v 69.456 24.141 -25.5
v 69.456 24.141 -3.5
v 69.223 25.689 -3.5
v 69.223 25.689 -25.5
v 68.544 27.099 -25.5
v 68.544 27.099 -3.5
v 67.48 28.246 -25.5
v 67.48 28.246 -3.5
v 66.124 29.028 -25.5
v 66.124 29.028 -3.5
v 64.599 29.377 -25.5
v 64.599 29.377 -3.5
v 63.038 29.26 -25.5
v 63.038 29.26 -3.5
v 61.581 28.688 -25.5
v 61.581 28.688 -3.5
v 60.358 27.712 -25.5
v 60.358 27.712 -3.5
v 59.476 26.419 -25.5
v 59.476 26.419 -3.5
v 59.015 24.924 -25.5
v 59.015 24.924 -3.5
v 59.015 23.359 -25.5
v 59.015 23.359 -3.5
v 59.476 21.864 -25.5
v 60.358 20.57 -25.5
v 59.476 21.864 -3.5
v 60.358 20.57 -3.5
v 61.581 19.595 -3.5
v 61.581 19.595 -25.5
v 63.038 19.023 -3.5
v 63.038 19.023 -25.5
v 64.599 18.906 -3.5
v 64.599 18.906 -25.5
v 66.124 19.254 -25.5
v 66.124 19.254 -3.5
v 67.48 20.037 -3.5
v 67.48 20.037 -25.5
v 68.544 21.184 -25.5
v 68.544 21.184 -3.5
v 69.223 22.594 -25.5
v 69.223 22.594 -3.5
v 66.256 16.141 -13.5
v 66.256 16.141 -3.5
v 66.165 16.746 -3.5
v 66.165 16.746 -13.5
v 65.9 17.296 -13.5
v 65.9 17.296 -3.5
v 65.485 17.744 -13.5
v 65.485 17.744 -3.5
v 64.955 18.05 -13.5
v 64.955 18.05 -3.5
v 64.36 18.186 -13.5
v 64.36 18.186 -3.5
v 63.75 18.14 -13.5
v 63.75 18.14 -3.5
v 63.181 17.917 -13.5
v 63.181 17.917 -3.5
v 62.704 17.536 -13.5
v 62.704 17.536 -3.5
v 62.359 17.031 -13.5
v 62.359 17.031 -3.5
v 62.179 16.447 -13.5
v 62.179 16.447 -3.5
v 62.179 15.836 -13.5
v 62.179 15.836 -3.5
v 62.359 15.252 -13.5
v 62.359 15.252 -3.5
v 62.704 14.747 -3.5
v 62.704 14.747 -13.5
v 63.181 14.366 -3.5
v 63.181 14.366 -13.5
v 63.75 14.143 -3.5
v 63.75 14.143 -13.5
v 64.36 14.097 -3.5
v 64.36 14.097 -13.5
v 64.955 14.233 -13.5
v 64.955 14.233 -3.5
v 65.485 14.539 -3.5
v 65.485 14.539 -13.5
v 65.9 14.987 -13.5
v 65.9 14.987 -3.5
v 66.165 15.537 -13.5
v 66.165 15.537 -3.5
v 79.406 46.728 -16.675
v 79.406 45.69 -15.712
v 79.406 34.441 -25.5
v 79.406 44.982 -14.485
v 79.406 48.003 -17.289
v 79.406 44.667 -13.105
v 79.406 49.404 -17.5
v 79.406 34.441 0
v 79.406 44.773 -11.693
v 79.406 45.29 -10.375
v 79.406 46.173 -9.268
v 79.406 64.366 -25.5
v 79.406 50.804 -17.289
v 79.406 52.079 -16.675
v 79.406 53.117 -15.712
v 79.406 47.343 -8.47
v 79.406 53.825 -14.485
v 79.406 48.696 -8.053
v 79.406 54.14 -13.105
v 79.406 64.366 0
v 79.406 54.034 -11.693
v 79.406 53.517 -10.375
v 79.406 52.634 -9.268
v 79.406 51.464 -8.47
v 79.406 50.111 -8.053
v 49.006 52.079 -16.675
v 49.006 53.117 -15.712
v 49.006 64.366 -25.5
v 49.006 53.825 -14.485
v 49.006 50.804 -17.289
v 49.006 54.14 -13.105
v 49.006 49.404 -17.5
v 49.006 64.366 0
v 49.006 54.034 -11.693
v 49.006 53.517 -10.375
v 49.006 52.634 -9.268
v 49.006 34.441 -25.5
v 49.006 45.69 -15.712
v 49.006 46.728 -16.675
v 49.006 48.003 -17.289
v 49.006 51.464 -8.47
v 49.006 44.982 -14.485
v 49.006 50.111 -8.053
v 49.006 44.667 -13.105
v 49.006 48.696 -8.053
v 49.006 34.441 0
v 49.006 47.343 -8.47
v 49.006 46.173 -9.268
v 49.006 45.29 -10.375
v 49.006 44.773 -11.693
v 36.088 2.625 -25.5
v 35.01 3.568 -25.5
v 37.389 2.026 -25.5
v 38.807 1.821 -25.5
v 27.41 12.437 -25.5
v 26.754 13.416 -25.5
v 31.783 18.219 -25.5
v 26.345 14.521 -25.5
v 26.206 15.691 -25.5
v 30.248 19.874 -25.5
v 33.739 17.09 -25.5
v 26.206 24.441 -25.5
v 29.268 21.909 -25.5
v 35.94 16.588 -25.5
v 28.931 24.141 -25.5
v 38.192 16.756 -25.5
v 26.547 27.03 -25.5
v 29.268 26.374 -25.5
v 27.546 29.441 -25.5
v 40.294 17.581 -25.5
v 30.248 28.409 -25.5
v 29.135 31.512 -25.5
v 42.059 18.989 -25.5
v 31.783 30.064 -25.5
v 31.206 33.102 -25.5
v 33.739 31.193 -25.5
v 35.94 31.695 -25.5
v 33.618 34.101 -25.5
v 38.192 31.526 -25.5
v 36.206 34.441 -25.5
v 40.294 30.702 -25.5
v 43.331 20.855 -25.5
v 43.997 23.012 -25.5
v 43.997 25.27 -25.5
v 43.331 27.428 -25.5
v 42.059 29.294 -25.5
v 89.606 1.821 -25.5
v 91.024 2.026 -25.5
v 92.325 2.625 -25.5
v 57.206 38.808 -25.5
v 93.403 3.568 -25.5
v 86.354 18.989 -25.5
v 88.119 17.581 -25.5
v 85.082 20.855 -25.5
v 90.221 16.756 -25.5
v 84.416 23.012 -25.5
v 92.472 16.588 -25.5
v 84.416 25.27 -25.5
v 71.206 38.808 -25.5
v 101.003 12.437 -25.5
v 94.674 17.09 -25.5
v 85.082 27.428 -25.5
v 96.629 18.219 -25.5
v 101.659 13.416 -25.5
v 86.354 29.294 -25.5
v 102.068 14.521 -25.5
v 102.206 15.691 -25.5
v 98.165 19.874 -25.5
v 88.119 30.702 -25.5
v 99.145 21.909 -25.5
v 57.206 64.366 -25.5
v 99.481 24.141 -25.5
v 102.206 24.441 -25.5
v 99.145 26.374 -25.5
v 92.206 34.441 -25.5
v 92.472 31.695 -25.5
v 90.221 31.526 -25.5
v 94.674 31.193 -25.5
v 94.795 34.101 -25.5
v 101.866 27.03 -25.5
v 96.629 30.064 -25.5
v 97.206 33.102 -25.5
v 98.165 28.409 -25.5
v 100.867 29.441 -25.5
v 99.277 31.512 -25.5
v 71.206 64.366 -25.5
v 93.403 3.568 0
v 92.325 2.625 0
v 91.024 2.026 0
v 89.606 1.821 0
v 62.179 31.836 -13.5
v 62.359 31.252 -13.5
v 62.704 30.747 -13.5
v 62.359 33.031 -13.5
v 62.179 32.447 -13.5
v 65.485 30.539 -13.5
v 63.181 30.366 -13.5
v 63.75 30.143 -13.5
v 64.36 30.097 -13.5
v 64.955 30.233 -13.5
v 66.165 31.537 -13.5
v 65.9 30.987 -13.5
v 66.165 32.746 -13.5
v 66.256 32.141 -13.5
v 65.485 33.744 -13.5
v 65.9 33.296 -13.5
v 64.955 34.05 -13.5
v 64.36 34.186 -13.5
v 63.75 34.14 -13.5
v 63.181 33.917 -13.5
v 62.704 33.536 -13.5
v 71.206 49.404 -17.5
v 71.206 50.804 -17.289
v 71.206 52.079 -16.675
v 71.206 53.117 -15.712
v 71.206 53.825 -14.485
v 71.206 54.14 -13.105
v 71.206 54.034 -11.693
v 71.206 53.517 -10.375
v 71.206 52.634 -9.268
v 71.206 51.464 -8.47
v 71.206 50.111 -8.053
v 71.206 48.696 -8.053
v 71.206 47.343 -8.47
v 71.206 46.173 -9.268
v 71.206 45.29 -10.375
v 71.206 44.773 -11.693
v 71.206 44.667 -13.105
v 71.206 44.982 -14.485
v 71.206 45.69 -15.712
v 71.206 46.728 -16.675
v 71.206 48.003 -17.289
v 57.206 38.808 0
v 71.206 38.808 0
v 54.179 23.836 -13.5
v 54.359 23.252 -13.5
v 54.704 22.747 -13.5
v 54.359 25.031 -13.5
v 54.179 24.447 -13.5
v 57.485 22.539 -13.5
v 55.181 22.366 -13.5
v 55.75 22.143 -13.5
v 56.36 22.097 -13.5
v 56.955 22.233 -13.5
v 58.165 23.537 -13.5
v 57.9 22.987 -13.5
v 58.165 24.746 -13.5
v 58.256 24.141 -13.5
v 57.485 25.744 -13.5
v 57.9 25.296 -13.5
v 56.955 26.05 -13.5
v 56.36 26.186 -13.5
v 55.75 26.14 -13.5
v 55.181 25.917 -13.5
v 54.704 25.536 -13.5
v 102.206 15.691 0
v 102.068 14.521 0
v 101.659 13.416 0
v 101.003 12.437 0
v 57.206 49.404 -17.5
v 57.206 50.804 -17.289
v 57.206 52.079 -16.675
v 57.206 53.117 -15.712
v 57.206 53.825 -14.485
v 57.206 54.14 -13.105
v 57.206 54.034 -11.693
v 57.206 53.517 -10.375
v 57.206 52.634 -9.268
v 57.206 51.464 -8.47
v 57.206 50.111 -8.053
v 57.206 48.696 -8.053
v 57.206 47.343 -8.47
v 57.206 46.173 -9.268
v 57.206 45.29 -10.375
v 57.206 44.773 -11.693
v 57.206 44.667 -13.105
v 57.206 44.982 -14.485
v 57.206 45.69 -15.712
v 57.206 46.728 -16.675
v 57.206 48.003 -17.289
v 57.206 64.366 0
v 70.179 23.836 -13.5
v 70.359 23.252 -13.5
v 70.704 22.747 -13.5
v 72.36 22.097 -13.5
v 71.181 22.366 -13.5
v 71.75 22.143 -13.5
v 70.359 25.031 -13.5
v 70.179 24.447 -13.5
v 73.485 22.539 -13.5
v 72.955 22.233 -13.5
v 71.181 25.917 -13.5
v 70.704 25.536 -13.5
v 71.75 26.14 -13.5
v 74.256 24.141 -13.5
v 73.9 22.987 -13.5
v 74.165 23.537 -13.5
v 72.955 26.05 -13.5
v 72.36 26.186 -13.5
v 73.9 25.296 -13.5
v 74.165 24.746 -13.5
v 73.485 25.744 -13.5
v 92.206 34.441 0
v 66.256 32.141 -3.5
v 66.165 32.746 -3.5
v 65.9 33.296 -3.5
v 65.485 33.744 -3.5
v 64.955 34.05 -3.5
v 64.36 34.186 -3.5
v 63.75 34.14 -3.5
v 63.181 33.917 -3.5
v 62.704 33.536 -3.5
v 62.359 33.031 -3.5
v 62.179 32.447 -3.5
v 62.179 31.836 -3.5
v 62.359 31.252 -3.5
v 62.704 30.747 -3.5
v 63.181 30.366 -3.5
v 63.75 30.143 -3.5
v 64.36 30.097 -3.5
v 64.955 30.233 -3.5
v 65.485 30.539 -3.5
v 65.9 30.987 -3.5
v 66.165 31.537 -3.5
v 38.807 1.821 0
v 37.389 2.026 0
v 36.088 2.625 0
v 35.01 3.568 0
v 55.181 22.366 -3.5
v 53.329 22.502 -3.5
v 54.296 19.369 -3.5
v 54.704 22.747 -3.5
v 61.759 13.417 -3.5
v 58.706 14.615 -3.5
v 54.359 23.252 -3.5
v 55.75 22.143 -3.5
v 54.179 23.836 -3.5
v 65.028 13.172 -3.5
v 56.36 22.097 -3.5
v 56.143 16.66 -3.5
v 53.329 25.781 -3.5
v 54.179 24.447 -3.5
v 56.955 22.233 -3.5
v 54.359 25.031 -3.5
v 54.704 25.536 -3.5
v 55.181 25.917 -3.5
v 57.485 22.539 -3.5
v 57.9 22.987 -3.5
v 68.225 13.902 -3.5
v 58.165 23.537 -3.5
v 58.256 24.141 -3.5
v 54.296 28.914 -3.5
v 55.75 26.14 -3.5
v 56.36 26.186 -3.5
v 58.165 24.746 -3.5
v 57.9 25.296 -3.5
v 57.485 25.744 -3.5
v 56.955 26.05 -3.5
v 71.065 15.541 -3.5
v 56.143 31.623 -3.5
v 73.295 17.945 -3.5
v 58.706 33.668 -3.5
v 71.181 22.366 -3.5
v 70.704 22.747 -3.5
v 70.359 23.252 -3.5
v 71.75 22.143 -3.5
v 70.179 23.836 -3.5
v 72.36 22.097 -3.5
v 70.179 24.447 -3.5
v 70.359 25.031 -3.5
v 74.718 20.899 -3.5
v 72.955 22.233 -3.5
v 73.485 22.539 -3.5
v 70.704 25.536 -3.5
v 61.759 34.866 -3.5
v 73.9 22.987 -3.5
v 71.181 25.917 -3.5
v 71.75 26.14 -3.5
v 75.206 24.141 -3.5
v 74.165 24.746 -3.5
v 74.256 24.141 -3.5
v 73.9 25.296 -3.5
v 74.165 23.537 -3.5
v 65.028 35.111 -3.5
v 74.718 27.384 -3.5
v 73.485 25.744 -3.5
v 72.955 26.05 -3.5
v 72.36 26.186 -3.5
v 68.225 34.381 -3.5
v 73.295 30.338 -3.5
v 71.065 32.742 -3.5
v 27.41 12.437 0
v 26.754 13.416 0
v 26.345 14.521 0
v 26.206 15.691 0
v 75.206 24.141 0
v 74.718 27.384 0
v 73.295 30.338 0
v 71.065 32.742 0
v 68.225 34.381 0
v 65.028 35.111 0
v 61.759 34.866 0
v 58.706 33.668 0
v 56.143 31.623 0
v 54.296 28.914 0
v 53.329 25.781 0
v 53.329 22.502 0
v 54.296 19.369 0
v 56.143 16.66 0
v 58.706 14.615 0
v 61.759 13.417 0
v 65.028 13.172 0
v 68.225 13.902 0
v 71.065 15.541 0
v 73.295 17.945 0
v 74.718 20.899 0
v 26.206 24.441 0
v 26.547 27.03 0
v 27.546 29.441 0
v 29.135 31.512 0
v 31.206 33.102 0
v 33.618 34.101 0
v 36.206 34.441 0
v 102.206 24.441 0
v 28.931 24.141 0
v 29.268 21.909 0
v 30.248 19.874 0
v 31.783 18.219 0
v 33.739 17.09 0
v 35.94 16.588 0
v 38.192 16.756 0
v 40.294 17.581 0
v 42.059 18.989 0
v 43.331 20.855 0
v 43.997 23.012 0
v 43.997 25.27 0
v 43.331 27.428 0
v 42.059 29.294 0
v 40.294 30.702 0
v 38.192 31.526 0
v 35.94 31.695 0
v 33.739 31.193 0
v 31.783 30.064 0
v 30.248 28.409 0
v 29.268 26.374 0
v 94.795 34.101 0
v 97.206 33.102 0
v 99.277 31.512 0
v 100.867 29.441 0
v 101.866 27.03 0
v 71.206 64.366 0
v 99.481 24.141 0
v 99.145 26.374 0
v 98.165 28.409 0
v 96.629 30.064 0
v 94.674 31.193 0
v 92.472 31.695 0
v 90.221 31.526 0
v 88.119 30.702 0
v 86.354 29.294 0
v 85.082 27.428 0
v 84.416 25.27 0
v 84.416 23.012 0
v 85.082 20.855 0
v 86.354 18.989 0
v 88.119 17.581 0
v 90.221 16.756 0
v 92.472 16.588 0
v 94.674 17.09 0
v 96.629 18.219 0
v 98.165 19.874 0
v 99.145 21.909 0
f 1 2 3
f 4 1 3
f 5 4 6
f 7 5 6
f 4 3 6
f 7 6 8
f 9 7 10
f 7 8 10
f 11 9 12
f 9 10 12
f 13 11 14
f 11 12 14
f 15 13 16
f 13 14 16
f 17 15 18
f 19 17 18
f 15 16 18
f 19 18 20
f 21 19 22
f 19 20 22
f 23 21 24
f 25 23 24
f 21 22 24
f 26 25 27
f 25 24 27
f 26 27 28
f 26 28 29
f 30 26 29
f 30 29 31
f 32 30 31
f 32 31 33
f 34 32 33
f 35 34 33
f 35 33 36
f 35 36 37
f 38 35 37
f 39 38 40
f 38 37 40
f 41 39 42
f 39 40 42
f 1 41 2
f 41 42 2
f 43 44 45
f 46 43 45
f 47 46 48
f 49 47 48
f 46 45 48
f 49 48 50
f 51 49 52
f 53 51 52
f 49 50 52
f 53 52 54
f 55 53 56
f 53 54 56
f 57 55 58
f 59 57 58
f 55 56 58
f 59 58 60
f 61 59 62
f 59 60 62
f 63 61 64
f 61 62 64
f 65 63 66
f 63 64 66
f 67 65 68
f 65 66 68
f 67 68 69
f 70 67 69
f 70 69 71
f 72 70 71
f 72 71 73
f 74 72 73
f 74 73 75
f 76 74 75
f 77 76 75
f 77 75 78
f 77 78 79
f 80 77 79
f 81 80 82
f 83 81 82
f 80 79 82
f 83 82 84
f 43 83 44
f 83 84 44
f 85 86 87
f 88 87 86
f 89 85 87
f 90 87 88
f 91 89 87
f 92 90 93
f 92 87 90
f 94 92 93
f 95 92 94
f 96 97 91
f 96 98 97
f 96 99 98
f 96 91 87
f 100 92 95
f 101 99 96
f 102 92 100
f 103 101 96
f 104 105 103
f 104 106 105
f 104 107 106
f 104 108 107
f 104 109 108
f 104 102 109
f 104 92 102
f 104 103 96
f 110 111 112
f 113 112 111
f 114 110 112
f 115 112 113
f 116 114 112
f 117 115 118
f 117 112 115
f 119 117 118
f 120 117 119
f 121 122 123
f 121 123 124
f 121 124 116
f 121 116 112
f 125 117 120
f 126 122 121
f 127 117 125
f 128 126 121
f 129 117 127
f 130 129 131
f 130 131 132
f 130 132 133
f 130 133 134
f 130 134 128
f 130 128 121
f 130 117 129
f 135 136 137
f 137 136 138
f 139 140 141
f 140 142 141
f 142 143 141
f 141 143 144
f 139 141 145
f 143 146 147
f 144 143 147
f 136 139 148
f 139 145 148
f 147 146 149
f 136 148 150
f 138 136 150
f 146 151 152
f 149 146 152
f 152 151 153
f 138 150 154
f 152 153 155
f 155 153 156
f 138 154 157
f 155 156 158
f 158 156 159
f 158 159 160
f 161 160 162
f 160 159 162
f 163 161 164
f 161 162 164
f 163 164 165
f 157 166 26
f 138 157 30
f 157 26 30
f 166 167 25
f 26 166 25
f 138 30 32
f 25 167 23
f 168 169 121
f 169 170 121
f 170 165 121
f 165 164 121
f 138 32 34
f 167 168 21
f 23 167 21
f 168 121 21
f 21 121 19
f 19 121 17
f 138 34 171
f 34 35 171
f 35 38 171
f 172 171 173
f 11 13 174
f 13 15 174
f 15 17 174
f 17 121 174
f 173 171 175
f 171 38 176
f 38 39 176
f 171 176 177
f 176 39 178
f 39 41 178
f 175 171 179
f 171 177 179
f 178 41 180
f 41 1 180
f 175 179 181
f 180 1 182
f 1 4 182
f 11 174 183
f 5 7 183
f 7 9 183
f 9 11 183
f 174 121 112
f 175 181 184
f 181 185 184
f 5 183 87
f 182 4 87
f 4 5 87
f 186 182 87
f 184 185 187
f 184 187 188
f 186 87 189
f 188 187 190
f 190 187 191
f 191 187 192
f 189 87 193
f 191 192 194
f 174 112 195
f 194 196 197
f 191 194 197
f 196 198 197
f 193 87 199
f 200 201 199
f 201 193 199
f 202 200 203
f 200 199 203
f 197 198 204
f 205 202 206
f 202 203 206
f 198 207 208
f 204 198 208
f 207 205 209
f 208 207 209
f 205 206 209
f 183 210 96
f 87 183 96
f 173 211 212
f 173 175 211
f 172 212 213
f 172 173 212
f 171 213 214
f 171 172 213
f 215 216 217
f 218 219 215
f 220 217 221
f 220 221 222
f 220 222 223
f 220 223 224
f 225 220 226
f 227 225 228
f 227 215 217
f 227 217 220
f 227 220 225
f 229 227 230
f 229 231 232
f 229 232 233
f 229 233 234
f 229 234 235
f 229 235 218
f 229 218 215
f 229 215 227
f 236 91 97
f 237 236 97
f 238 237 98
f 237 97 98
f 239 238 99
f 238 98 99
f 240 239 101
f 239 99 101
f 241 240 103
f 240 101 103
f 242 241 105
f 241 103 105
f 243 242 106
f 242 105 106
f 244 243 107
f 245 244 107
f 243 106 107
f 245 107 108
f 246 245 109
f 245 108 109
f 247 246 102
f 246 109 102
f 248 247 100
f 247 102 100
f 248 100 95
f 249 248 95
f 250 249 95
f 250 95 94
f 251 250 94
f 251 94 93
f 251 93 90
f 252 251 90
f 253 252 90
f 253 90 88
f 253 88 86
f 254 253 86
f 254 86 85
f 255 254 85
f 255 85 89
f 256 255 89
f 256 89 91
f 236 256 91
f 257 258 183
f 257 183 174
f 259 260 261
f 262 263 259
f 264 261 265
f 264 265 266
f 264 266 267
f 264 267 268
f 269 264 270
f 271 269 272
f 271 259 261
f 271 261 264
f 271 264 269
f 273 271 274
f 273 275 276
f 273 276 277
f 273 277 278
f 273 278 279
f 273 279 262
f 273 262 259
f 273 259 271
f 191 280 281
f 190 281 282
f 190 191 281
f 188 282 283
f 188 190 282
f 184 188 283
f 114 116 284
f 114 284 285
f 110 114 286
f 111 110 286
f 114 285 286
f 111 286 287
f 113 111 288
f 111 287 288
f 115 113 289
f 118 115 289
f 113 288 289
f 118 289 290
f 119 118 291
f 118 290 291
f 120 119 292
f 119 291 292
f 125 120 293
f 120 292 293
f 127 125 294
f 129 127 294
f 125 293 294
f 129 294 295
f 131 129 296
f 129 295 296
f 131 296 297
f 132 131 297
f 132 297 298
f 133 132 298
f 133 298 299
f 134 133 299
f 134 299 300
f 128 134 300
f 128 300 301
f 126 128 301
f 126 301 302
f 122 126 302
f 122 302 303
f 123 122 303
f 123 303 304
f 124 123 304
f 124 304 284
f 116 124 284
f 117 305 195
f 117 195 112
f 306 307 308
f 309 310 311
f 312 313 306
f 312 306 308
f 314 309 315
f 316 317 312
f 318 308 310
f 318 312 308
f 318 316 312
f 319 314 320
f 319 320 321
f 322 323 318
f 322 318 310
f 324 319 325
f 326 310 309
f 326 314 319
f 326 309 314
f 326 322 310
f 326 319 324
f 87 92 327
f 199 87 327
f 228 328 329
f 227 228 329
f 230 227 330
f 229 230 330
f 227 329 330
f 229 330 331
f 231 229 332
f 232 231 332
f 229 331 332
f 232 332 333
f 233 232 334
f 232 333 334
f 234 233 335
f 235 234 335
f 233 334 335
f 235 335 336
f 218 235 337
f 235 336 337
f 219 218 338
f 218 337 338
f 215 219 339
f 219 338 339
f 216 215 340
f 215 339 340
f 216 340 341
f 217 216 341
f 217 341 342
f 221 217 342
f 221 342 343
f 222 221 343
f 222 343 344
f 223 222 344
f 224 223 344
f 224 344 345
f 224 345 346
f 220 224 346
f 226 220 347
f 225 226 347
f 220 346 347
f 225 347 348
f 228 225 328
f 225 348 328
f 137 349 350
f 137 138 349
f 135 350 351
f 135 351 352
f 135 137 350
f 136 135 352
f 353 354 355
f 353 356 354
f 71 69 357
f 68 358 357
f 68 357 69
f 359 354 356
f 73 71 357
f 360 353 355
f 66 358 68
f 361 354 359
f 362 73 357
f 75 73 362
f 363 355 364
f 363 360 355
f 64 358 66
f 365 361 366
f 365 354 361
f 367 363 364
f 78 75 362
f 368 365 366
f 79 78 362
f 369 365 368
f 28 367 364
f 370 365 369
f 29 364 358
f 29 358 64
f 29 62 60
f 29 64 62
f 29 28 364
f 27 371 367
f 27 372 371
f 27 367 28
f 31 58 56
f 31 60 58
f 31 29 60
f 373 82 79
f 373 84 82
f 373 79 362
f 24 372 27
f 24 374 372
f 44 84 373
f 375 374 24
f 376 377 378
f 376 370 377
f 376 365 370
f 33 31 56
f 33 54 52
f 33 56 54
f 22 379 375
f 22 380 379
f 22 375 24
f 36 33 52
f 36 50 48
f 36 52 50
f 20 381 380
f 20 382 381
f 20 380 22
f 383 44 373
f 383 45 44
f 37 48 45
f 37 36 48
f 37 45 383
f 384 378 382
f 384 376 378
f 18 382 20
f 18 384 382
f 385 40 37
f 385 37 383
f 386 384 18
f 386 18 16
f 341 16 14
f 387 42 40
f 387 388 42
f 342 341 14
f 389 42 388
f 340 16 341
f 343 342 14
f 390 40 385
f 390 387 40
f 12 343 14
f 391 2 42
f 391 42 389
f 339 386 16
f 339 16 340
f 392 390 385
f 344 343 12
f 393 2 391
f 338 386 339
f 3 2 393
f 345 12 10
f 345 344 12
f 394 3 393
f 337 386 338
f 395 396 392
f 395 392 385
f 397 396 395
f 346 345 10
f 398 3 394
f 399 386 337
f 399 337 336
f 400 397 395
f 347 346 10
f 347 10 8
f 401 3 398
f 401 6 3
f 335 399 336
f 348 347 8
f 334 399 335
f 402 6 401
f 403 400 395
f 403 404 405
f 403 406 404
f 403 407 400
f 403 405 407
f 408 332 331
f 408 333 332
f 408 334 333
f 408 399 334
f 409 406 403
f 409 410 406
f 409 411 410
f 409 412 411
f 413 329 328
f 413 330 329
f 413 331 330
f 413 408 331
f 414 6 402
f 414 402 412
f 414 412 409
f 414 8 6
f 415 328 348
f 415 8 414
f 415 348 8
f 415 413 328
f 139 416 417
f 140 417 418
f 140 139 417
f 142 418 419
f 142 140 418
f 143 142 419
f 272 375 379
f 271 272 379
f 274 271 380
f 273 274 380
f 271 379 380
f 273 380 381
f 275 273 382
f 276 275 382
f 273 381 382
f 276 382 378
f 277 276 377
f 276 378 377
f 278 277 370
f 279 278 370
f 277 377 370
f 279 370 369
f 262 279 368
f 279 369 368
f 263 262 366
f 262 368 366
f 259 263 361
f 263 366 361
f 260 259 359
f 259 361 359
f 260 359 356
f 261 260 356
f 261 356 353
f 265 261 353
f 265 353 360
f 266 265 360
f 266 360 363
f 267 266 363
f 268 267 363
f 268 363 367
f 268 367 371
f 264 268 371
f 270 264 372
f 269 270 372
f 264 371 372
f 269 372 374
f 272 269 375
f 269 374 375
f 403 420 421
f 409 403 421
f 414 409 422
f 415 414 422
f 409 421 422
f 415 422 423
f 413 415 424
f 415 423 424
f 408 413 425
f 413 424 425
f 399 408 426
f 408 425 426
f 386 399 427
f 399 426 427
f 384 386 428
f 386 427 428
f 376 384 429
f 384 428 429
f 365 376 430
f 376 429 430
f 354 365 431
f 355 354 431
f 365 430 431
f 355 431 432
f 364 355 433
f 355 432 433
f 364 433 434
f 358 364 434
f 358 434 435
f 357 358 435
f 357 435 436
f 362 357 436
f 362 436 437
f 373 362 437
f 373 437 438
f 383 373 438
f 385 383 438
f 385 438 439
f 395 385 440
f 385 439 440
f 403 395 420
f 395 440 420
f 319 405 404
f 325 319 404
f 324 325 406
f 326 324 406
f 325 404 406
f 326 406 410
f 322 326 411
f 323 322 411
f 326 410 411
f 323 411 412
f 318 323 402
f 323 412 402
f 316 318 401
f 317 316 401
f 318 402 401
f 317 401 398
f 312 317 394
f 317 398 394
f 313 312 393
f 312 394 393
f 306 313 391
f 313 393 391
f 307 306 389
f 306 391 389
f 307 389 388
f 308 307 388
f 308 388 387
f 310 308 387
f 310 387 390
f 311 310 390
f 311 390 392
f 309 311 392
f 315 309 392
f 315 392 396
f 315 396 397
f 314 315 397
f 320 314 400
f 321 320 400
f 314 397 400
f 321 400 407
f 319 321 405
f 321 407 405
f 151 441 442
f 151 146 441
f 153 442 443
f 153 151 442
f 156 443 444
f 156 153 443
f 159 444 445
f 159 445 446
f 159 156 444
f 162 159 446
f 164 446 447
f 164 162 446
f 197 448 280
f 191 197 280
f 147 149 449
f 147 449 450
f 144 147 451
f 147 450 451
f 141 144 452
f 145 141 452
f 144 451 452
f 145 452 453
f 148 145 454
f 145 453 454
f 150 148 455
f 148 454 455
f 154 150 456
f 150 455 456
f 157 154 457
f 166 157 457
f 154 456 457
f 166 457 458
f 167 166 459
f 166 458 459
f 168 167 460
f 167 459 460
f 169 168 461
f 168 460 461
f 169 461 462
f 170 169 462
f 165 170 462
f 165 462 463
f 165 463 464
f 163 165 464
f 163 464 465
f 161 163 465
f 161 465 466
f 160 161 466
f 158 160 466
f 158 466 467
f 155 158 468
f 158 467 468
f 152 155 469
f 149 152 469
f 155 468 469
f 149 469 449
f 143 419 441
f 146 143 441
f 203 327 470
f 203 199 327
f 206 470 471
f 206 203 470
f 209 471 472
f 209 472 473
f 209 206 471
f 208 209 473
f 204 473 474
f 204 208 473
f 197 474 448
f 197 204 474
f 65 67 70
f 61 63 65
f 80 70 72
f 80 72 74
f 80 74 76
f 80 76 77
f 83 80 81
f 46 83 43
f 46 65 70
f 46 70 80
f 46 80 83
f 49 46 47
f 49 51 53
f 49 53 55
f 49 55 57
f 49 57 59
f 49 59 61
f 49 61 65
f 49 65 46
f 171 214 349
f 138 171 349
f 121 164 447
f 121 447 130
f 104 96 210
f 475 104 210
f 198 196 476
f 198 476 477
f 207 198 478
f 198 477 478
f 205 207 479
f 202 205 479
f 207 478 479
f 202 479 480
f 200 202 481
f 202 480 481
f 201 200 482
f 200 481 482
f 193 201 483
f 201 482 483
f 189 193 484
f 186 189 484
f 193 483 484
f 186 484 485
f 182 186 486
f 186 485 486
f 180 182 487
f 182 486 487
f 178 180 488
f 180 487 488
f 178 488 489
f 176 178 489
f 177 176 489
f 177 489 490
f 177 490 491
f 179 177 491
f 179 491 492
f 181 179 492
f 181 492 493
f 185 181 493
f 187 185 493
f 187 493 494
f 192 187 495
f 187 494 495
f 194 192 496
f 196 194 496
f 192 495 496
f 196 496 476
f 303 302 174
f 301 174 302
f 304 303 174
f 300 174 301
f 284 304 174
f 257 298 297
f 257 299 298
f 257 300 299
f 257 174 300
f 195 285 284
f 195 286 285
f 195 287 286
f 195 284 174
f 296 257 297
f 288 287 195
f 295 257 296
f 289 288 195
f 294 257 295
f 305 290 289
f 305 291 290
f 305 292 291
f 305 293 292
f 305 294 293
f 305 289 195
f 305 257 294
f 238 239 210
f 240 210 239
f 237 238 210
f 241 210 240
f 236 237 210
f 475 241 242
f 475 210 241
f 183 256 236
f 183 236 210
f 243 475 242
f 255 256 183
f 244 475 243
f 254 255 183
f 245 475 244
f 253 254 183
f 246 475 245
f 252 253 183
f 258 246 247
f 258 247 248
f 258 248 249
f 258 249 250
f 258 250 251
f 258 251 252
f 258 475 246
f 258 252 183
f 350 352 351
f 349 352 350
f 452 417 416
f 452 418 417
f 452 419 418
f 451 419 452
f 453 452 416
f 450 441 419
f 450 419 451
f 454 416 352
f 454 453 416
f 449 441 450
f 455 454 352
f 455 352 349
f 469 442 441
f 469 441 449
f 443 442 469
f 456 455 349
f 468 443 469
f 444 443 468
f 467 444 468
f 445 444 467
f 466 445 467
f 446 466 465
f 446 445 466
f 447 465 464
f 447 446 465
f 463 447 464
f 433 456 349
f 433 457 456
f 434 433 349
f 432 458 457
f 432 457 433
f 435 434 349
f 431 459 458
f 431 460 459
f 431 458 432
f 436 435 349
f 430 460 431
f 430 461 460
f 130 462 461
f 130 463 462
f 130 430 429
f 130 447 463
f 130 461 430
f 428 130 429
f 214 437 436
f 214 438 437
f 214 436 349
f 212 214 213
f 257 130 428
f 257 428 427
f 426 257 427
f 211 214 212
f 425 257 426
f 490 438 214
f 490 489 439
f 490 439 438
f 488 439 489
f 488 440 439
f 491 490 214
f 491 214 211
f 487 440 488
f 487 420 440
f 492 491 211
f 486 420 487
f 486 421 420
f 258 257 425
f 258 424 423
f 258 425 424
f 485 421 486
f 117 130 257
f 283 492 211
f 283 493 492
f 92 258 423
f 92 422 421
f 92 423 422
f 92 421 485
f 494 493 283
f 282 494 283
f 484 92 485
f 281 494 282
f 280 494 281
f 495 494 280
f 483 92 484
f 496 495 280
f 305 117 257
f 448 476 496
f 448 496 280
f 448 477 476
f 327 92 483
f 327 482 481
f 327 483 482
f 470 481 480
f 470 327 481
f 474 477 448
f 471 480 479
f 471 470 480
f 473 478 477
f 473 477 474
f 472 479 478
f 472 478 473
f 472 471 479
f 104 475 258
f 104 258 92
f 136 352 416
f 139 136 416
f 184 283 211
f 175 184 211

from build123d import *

# Parameters (mm, degrees)
CROQUIS1_R              = 7.575
SALIENTE_EXTRUIR1_DEPTH = 25.5
BOSS_EXTRUDE1_DEPTH     = 25.5
SKETCH7_R               = 11
CUT_EXTRUDE1_DEPTH      = 3.5
SKETCH9_R               = 5.25
CUT_EXTRUDE3_DEPTH      = 22
REDONDEO1_R             = 10
FILLET1_R               = 5
SKETCH8_R               = 4.75
CUT_EXTRUDE2_DEPTH      = 88.312260382
SKETCH11_R              = 2.05
CUT_EXTRUDE4_DEPTH      = 10


with BuildPart() as part:
    # Croquis1 → Saliente-Extruir1 (new body)
    with BuildSketch(Plane.XY):
        Polygon((79.406412185, 15.36568027), (79.406412185, 34.441404803), (102.206412031, 34.441404803), (102.206412031, 13.841404803), (91.906412031, 1.820896426), (36.506412031, 1.820896426), (26.206412031, 13.841404803), (26.206412031, 34.441404803), (49.006411878, 34.441404803), (49.006411878, 15.36568027), (64.10641184, 6.647691683), (64.206412031, 6.589956548), (64.306412223, 6.647691683), align=None)
        with Locations((91.906412031, 24.141404803)):
            Circle(CROQUIS1_R, mode=Mode.SUBTRACT)
        with Locations(Location((36.506412031, 24.141404803, 0), (0, 0, 180))):
            Circle(CROQUIS1_R, mode=Mode.SUBTRACT)
    extrude(amount=-SALIENTE_EXTRUIR1_DEPTH)

    # Sketch4 → Boss-Extrude1 (add)
    with BuildSketch(Plane.XY):
        Polygon((64.206412031, 6.589956548), (79.406412185, 15.36568027), (79.406412185, 64.36568027), (71.206412031, 64.36568027), (71.206412031, 38.80809142), (57.206412031, 38.80809142), (57.206412031, 64.36568027), (49.006411878, 64.36568027), (49.006411878, 15.36568027), align=None)
    extrude(amount=-BOSS_EXTRUDE1_DEPTH)

    # Sketch7 → Cut-Extrude1 (cut)
    with BuildSketch(Plane.XY):
        with Locations((64.206412031, 24.141404803)):
            Circle(SKETCH7_R)
    extrude(amount=-CUT_EXTRUDE1_DEPTH, mode=Mode.SUBTRACT)

    # Sketch9 → Cut-Extrude3 (cut)
    with BuildSketch(Plane.XY.offset(-3.5)):
        with Locations((64.206412031, 24.141404803)):
            Circle(SKETCH9_R)
    extrude(amount=-CUT_EXTRUDE3_DEPTH, mode=Mode.SUBTRACT)

    # Redondeo1
    redondeo1_edges = [part.edges().sort_by_distance(p)[0] for p in [
        (102.206412031, 34.441404803, -12.75),
        (26.206412031, 34.441404803, -12.75),
    ]]
    fillet(redondeo1_edges, radius=REDONDEO1_R)

    # Fillet1
    fillet1_edges = [part.edges().sort_by_distance(p)[0] for p in [
        (102.206412031, 13.841404803, -12.75),
        (91.906412031, 1.820896426, -12.75),
        (36.506412031, 1.820896426, -12.75),
        (26.206412031, 13.841404803, -12.75),
    ]]
    fillet(fillet1_edges, radius=FILLET1_R)

    # Sketch8 → Cut-Extrude2 (cut, through all)
    with BuildSketch(Plane(origin=(79.406412185, 0, 0), x_dir=(0, 0, -1), z_dir=(1, 0, 0))):
        with Locations((12.75, 49.403542537)):
            Circle(SKETCH8_R)
    extrude(amount=-CUT_EXTRUDE2_DEPTH, mode=Mode.SUBTRACT)

    # Sketch11 → Cut-Extrude4 (cut)
    with BuildSketch(Plane.XY.offset(-3.5)):
        with Locations((72.206412031, 24.141404803)):
            Circle(SKETCH11_R)
        with Locations((64.206412031, 32.141404803)):
            Circle(SKETCH11_R)
        with Locations((56.206412031, 24.141404803)):
            Circle(SKETCH11_R)
        with Locations((64.206412031, 16.141404803)):
            Circle(SKETCH11_R)
    extrude(amount=-CUT_EXTRUDE4_DEPTH, mode=Mode.SUBTRACT)


solid = part.part
